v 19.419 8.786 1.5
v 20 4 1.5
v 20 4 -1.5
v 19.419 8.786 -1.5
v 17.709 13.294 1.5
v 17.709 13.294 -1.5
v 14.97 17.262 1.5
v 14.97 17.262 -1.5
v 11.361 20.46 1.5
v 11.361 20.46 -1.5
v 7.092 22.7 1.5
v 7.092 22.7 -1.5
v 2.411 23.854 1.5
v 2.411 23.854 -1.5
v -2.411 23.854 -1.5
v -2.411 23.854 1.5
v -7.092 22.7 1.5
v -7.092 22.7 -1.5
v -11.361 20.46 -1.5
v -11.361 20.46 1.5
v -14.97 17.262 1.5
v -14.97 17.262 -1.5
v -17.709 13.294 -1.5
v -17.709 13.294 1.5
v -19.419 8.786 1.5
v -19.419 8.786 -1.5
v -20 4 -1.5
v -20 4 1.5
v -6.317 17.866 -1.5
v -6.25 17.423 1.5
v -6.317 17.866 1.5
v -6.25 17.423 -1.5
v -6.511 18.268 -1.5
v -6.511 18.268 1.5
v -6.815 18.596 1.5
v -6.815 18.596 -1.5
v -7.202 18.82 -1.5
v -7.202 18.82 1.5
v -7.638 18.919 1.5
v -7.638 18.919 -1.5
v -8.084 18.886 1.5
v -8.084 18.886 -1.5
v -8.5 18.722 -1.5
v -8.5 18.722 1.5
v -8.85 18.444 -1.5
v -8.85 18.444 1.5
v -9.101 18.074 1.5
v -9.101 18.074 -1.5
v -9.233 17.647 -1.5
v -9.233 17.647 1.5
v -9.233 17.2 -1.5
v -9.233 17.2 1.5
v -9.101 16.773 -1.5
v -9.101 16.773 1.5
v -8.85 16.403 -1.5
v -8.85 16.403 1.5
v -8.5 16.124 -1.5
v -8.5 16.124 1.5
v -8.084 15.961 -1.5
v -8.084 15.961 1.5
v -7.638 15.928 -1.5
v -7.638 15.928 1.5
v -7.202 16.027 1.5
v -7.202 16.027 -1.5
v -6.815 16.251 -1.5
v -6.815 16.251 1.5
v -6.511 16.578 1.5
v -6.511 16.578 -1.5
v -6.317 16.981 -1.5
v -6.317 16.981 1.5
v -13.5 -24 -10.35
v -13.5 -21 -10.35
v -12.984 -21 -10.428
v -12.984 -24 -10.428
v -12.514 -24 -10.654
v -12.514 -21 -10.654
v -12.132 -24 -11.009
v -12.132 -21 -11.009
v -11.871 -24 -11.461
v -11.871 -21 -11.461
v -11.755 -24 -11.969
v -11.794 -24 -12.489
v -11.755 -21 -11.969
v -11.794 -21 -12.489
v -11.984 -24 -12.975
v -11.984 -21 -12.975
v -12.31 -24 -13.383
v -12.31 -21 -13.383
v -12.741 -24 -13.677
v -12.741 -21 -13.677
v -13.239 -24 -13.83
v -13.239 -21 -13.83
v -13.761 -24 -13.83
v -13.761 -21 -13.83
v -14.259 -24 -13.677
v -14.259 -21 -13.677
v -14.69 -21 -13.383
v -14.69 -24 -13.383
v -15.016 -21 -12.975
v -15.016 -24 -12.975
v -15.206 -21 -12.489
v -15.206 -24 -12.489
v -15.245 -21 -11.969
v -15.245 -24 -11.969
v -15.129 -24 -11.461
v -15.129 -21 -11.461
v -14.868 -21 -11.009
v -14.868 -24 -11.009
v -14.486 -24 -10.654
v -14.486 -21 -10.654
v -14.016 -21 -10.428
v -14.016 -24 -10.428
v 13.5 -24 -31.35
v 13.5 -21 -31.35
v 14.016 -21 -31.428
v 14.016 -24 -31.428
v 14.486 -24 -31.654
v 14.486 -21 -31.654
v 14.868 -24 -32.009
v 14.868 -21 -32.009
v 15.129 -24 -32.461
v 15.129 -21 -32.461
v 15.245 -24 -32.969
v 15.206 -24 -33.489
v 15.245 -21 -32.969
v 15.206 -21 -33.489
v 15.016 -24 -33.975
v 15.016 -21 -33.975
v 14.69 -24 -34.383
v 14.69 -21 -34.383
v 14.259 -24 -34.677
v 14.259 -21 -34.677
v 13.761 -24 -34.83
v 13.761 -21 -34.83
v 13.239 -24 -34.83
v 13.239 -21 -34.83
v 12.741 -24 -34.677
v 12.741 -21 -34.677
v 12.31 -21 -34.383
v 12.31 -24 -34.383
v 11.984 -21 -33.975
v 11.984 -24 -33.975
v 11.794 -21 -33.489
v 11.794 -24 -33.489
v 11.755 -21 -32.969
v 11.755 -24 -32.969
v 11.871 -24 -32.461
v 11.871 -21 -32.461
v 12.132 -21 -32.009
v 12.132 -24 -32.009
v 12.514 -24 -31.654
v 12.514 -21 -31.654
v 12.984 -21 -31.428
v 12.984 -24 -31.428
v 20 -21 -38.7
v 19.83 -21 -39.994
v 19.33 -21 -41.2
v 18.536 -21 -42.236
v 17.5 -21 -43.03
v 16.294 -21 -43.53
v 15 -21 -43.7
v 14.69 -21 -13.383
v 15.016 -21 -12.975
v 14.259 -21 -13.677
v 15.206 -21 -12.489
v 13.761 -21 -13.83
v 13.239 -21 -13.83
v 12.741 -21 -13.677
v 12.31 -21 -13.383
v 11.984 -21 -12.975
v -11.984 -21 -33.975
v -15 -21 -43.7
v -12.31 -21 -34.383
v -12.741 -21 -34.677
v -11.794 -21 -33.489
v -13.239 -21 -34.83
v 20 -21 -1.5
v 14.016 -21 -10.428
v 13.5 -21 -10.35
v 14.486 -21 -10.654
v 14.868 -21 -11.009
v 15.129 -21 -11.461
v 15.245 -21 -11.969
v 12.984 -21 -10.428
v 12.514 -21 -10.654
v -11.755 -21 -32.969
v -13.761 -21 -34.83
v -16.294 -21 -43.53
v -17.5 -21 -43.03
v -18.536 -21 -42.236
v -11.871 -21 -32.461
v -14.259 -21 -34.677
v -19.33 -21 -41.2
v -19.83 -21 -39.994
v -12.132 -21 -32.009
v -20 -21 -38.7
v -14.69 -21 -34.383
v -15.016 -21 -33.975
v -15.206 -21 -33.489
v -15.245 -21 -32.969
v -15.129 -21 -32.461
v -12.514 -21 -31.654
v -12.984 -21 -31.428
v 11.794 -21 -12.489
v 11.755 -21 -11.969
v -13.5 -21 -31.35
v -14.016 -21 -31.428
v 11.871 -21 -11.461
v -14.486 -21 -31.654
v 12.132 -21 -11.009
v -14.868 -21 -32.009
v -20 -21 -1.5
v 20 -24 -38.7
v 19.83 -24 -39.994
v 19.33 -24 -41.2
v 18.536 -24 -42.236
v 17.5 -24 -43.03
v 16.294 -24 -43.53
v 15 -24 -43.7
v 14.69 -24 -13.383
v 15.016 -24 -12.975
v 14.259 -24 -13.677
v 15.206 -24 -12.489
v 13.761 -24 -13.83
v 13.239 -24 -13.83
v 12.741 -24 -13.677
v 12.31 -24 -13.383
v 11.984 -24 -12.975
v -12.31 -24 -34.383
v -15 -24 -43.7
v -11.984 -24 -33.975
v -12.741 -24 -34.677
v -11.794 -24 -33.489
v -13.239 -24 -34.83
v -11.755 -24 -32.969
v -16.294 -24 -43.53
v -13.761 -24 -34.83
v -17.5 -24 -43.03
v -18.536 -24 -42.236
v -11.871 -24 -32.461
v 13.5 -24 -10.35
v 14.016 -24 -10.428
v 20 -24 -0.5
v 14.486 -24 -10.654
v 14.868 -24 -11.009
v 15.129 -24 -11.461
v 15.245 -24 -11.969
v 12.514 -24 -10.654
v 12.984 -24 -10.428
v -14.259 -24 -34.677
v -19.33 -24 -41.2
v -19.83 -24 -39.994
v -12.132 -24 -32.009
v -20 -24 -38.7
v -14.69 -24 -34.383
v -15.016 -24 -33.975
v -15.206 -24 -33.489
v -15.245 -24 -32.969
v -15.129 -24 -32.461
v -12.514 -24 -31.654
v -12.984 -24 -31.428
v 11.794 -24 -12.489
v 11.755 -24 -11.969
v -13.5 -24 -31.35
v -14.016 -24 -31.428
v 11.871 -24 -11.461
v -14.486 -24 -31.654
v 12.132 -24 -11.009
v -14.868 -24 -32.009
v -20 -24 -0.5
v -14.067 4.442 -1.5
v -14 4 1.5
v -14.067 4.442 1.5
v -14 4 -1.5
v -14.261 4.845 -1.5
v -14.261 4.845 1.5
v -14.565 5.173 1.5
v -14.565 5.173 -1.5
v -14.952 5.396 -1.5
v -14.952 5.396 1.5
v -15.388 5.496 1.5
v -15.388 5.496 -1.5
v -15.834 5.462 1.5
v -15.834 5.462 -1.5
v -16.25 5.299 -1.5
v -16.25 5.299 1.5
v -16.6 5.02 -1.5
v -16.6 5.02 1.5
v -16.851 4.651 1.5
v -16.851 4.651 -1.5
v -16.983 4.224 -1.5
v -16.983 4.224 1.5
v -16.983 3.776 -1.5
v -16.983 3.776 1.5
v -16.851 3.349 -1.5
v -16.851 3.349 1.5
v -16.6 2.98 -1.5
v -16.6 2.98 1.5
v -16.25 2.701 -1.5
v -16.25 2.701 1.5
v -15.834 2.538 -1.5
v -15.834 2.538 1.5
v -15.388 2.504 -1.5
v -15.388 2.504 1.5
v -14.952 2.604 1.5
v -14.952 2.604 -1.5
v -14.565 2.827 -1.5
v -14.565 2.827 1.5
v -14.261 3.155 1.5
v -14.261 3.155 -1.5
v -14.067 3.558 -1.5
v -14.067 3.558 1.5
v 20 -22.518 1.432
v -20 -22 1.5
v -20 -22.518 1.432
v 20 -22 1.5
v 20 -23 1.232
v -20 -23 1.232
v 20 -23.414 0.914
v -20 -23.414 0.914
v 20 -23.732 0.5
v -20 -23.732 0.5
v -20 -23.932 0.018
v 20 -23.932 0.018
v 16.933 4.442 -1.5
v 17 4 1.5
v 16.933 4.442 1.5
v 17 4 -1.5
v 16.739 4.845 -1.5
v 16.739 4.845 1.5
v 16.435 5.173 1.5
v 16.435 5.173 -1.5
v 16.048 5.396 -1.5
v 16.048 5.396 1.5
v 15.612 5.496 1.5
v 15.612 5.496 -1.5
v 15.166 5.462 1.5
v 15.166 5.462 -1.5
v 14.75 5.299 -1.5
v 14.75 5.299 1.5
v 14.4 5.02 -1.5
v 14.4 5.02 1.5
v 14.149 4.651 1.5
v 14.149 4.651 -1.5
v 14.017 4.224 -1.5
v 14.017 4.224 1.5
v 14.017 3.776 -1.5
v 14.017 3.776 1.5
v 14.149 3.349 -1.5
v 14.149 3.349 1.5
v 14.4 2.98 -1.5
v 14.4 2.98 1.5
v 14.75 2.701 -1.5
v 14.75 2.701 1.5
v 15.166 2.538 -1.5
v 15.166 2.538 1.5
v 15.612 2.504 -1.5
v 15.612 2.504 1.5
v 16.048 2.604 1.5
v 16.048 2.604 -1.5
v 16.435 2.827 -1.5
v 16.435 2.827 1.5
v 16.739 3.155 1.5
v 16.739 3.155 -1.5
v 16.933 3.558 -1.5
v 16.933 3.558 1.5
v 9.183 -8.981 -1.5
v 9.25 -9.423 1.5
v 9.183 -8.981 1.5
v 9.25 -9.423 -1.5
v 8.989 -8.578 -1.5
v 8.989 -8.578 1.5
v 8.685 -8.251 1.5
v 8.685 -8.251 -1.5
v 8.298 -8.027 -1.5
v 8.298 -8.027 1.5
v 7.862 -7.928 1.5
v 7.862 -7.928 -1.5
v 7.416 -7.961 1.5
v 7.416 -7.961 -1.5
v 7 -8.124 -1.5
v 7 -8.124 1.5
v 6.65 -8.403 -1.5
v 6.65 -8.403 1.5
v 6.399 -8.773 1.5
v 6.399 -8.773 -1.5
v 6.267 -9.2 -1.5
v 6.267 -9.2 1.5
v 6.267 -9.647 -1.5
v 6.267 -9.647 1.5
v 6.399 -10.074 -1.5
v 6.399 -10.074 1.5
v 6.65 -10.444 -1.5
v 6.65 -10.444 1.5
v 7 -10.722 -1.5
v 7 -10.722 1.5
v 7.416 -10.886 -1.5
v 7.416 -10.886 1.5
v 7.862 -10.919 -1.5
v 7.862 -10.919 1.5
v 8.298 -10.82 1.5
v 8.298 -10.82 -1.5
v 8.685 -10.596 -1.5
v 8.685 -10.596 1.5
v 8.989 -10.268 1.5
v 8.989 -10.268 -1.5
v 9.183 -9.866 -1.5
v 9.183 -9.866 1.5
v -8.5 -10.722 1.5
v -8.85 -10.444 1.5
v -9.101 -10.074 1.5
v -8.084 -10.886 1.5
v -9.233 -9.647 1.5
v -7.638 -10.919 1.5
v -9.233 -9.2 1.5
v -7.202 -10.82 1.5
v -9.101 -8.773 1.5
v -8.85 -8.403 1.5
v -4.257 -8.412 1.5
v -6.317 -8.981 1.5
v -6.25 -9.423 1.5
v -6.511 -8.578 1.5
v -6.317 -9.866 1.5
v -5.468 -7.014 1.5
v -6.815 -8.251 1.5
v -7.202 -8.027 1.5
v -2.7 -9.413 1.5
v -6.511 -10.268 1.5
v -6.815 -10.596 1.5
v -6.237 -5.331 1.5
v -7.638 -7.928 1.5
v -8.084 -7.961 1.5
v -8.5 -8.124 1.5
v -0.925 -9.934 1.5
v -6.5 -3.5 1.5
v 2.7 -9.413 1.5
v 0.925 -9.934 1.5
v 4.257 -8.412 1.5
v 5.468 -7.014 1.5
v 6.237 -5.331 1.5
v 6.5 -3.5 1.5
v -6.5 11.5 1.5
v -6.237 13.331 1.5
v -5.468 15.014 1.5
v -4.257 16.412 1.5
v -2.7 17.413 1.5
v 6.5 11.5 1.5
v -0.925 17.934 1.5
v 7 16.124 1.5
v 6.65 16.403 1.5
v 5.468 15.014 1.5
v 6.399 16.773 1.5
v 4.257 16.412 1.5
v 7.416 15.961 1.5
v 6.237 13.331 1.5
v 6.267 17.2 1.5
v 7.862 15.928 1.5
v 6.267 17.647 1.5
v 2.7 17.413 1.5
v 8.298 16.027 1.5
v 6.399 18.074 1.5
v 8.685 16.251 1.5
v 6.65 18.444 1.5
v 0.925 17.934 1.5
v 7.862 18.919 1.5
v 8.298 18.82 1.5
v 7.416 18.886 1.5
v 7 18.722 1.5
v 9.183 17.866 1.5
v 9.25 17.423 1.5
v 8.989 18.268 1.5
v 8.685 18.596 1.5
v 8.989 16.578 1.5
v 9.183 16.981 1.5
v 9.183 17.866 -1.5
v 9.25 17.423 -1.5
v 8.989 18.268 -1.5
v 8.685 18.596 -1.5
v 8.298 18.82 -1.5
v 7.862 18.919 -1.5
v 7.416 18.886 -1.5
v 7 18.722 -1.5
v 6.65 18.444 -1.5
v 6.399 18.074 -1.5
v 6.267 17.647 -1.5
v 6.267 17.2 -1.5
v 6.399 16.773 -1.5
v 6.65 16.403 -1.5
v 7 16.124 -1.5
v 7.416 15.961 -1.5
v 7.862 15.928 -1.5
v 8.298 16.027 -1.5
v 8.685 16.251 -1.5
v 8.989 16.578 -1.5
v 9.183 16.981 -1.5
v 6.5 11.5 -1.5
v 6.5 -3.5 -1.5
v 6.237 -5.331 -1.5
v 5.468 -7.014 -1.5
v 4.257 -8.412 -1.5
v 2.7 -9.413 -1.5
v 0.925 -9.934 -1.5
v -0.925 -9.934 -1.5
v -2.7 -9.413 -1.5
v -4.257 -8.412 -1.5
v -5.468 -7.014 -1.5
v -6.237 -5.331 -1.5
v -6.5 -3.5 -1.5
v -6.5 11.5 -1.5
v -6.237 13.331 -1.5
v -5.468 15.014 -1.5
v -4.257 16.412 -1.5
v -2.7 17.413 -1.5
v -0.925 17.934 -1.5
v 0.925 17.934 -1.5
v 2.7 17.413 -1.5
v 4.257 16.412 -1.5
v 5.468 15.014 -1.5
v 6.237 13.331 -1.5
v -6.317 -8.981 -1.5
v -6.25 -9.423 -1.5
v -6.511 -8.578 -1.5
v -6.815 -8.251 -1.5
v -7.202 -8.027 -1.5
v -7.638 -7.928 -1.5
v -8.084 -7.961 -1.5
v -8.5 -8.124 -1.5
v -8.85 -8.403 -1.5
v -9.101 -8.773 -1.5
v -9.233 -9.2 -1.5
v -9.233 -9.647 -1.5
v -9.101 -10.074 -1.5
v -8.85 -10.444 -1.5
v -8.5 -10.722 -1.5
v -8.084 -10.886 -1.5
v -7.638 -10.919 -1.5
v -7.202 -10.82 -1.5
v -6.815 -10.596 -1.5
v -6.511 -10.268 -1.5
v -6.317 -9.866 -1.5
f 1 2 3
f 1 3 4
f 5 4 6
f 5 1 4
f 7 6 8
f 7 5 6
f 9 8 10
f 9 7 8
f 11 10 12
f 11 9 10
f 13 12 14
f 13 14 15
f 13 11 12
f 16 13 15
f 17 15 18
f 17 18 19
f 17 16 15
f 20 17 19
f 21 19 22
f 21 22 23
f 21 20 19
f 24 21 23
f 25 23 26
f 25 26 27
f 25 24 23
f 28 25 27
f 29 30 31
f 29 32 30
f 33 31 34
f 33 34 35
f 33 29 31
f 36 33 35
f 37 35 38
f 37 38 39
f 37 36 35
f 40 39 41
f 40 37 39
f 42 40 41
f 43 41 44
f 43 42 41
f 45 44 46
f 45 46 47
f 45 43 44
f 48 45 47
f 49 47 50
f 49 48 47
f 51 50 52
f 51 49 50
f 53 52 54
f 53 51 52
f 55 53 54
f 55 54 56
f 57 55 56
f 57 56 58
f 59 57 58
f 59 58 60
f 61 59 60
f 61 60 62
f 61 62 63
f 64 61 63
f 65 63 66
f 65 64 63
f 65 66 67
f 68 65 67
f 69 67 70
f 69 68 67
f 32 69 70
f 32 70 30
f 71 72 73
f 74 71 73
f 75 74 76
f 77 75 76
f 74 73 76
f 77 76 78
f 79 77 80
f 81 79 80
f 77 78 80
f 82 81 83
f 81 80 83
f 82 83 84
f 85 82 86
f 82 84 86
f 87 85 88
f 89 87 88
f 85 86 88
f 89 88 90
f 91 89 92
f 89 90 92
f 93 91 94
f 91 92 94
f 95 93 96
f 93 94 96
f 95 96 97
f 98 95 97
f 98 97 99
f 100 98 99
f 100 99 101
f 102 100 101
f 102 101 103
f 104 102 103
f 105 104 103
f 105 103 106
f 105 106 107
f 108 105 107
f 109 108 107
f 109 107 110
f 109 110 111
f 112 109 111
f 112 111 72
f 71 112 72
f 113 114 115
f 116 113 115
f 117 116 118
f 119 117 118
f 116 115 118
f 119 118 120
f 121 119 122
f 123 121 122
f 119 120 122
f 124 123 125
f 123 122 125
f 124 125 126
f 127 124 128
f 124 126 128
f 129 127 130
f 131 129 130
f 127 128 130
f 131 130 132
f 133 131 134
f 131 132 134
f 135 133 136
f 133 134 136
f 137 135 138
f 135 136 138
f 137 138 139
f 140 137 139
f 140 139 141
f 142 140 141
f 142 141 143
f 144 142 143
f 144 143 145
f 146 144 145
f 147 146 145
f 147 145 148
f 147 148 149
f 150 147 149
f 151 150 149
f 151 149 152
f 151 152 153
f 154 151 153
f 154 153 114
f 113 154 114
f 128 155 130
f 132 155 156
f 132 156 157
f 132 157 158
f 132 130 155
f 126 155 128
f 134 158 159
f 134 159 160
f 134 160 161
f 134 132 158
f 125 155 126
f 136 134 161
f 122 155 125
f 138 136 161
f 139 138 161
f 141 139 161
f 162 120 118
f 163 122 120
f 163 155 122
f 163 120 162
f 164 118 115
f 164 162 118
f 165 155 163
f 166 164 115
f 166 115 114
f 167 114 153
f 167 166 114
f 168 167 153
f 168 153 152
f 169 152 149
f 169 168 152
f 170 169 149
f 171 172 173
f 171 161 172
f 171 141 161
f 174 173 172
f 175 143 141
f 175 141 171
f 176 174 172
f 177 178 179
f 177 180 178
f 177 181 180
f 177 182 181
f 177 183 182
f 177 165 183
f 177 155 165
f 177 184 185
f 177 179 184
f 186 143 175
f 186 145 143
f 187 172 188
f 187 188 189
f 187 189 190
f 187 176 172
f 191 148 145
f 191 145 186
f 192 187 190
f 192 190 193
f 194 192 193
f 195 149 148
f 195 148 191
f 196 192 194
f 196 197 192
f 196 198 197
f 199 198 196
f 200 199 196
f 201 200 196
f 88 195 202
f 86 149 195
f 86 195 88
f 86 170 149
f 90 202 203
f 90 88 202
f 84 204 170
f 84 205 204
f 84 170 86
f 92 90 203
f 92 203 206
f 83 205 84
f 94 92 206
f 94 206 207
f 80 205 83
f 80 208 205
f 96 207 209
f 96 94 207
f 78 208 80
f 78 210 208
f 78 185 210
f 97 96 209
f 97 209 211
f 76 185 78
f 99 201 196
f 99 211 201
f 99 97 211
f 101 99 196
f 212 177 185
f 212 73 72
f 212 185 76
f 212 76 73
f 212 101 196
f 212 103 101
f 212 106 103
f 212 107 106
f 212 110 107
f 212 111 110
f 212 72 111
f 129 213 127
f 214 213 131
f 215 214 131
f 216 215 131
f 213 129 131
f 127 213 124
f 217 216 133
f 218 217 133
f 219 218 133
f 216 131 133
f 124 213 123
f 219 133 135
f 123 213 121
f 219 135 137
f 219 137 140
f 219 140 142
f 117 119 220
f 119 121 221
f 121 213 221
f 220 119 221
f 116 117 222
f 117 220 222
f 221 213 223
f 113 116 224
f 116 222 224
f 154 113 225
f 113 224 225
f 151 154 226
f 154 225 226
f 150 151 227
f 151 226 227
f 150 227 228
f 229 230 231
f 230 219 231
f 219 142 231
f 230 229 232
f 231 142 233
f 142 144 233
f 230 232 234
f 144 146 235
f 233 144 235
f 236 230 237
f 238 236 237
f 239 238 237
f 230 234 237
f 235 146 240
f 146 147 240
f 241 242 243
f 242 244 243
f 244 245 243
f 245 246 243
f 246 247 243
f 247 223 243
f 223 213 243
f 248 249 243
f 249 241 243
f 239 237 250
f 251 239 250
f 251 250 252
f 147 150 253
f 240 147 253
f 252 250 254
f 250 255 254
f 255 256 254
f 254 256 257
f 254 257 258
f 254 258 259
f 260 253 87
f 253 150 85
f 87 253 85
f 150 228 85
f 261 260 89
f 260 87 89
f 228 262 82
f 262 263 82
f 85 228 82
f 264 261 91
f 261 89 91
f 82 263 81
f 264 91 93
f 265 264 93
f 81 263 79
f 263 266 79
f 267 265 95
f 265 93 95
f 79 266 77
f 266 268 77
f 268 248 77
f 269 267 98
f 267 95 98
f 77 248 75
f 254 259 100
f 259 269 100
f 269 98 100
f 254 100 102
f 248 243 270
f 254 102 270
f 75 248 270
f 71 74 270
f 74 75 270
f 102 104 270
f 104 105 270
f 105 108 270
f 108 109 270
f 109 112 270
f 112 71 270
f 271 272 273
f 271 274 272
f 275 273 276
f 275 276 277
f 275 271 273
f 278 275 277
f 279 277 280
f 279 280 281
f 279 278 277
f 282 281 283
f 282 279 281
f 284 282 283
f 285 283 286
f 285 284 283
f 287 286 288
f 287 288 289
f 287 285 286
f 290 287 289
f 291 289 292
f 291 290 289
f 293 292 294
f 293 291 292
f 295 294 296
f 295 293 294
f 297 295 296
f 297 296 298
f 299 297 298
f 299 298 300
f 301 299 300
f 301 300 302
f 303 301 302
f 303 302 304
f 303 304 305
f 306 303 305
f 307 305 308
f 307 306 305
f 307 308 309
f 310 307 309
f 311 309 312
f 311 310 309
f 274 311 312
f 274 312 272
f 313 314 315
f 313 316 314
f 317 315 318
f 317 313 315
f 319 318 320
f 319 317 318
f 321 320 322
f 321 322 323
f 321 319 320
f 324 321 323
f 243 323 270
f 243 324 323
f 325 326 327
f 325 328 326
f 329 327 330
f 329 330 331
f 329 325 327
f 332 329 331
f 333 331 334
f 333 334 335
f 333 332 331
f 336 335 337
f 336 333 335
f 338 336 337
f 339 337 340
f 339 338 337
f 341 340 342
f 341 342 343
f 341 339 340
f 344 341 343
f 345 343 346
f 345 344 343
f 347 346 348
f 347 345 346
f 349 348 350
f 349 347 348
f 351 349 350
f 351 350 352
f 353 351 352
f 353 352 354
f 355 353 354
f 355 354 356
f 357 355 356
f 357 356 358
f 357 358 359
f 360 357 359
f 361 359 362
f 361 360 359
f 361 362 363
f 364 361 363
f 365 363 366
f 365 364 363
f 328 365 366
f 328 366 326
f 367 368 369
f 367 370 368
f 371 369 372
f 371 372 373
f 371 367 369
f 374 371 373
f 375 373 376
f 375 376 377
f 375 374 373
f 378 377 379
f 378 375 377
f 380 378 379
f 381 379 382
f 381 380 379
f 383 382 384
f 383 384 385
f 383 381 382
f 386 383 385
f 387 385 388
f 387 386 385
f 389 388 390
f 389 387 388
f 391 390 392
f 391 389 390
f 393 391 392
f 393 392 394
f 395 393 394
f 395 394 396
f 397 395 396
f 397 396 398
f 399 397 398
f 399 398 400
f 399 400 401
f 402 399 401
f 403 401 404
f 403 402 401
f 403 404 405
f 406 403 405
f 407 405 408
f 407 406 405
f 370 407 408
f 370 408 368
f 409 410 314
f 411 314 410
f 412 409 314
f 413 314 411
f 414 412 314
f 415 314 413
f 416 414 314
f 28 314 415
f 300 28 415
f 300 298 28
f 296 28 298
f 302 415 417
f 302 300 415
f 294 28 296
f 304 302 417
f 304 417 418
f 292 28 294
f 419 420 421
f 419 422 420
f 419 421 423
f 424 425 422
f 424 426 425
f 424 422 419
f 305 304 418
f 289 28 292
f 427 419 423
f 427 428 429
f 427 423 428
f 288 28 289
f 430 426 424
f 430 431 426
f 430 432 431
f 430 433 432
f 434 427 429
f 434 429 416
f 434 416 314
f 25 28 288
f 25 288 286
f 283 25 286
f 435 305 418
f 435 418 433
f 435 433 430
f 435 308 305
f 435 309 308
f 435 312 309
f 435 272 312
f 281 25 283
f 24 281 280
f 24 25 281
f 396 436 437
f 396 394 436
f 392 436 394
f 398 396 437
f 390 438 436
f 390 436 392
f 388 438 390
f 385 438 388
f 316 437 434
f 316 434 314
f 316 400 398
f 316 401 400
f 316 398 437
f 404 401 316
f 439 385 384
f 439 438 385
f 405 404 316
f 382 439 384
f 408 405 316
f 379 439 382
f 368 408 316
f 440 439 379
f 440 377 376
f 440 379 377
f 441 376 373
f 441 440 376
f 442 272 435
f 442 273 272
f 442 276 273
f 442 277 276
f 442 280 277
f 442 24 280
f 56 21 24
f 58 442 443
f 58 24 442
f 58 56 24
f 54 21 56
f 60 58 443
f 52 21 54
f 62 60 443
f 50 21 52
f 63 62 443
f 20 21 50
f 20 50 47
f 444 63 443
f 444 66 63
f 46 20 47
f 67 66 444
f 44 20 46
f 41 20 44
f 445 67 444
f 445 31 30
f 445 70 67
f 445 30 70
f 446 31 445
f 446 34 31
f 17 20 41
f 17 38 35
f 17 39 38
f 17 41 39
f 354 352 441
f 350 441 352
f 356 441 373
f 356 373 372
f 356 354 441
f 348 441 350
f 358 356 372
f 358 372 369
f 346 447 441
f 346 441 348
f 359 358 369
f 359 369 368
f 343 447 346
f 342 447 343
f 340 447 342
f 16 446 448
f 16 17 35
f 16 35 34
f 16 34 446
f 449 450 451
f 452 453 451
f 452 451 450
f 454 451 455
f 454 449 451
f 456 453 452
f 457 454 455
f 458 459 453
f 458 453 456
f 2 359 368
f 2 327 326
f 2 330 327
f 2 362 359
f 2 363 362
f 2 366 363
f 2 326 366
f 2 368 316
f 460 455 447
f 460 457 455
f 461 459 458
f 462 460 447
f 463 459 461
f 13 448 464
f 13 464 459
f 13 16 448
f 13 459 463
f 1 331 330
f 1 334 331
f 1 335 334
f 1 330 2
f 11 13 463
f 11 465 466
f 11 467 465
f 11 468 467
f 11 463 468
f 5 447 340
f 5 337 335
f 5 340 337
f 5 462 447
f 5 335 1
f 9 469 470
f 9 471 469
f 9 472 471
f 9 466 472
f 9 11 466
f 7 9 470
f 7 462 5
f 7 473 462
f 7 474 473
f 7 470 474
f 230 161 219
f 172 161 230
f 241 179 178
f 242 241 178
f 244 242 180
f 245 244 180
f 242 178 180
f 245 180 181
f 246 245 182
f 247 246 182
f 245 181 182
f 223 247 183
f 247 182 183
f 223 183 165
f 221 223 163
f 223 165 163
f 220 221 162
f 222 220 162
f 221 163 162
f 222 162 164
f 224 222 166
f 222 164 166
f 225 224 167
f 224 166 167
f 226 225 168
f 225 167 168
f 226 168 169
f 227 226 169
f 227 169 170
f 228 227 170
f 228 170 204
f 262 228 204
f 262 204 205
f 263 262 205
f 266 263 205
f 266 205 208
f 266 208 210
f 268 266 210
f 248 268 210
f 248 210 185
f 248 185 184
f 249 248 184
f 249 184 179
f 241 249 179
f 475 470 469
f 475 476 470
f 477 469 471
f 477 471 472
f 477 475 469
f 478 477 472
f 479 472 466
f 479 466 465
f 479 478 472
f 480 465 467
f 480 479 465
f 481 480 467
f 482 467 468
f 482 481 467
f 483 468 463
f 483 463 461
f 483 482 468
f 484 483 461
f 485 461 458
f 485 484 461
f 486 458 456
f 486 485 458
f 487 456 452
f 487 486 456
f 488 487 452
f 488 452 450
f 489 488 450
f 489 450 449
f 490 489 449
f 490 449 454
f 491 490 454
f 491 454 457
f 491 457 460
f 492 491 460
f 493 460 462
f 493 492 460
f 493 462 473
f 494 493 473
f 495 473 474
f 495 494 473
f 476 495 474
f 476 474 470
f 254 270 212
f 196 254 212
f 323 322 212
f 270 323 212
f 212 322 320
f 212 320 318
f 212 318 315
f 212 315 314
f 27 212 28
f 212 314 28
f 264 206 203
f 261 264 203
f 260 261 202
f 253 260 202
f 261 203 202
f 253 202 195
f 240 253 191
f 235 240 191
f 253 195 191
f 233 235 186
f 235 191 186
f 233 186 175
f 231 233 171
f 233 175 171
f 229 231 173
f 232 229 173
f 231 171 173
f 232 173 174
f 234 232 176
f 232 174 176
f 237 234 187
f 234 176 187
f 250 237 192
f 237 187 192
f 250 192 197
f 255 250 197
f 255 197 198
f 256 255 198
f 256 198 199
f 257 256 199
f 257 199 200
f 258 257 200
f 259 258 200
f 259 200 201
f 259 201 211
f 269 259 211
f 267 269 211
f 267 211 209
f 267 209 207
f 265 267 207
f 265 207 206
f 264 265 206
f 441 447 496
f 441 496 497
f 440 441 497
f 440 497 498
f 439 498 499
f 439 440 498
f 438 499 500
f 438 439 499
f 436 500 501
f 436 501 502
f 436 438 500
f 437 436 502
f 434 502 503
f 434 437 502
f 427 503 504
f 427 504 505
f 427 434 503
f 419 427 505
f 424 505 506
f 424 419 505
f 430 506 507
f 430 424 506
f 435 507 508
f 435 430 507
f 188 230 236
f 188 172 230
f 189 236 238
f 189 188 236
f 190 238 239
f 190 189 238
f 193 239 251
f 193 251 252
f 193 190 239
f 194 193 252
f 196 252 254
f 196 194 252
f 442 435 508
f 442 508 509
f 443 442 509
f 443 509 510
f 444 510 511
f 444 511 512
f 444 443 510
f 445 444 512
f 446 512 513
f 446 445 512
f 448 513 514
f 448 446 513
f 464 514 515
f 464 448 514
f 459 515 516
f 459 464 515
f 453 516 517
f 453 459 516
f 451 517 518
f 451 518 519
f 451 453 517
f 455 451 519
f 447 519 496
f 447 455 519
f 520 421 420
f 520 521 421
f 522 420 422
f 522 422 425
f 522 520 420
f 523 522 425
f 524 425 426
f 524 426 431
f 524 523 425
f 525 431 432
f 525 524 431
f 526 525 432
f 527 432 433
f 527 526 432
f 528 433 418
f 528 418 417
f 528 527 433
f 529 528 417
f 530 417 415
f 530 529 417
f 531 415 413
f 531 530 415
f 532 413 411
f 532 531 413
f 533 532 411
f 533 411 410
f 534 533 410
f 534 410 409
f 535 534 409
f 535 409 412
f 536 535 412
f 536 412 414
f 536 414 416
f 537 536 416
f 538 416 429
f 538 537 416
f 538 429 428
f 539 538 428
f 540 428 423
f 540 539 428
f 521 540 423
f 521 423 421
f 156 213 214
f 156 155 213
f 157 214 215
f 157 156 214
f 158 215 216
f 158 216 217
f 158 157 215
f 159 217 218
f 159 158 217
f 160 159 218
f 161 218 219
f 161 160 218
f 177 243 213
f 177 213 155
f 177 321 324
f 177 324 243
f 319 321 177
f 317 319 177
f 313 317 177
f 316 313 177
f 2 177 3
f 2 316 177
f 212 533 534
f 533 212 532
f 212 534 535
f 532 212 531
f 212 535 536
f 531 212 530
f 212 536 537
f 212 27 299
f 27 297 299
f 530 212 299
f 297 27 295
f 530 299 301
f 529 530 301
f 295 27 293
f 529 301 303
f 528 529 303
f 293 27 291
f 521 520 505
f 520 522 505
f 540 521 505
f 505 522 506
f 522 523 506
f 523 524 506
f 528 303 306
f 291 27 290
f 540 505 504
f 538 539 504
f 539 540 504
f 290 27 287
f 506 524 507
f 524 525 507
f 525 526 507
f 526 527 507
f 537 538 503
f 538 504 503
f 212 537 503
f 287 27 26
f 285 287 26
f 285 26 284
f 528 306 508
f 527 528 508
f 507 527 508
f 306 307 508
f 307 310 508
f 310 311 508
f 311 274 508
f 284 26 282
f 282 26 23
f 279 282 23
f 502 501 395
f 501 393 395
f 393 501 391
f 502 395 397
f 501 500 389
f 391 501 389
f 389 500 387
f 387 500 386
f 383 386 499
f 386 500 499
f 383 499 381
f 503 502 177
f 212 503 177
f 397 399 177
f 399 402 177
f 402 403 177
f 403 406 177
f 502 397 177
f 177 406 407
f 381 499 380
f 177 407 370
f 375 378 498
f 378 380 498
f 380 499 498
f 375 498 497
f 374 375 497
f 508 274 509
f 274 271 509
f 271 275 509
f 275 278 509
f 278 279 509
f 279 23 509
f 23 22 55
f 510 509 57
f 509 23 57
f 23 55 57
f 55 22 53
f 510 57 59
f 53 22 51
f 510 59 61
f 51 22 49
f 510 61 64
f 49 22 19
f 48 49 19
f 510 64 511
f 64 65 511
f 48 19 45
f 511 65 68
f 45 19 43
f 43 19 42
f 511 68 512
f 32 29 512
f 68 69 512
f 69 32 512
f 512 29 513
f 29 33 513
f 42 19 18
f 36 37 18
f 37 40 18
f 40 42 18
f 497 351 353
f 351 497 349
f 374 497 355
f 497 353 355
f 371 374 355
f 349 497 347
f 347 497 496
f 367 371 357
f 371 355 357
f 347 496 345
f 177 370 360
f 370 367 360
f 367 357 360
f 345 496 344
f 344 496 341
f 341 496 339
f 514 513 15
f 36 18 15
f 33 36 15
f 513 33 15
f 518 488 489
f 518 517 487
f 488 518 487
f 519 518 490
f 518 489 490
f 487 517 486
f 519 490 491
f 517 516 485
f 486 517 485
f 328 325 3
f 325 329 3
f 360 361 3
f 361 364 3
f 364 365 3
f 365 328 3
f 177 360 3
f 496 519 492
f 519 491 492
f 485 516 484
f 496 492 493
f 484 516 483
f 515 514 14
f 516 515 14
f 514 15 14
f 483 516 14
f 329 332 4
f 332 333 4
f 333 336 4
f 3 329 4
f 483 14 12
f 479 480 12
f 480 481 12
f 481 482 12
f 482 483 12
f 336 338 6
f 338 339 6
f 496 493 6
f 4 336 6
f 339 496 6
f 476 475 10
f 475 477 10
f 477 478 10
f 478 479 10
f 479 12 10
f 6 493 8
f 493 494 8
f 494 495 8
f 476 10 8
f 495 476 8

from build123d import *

# Parameters (mm, degrees)
CROQUIS1_R              = 1.5
SALIENTE_EXTRUIR1_DEPTH = 1.5
CORTAR_EXTRUIR3_DEPTH   = 3
CROQUIS3_W              = 40
CROQUIS3_H              = 3
SALIENTE_EXTRUIR2_DEPTH = 42.2
CROQUIS4_R              = 1.75
CORTAR_EXTRUIR5_DEPTH   = 42.2
REDONDEO1_R             = 2
REDONDEO2_R             = 5


with BuildPart() as part:
    # Croquis1 → Saliente-Extruir1 (new, symmetric)
    with BuildSketch(Plane.XY):
        with BuildLine():
            Line((-20, -24), (20, -24))
            Line((20, -24), (20, 4))
            ThreePointArc((20, 4), (0, 24), (-20, 4))
            Line((-20, 4), (-20, -24))
        make_face()
        with Locations((-15.5, 4)):
            Circle(CROQUIS1_R, mode=Mode.SUBTRACT)
        with Locations((-7.75, 17.423393759)):
            Circle(CROQUIS1_R, mode=Mode.SUBTRACT)
        with Locations((7.75, 17.423393759)):
            Circle(CROQUIS1_R, mode=Mode.SUBTRACT)
        with Locations((15.5, 4)):
            Circle(CROQUIS1_R, mode=Mode.SUBTRACT)
        with Locations((7.75, -9.423393759)):
            Circle(CROQUIS1_R, mode=Mode.SUBTRACT)
        with Locations((-7.75, -9.423393759)):
            Circle(CROQUIS1_R, mode=Mode.SUBTRACT)
    extrude(amount=SALIENTE_EXTRUIR1_DEPTH, both=True)

    # Croquis2 → Cortar-Extruir3 (cut)
    with BuildSketch(Plane.XY.offset(1.5)):
        with BuildLine():
            Line((6.5, 11.5), (6.5, -3.5))
            ThreePointArc((6.5, -3.5), (0, -10), (-6.5, -3.5))
            Line((-6.5, -3.5), (-6.5, 11.5))
            ThreePointArc((-6.5, 11.5), (0, 18), (6.5, 11.5))
        make_face()
    extrude(amount=-CORTAR_EXTRUIR3_DEPTH, mode=Mode.SUBTRACT)

    # Croquis3 → Saliente-Extruir2 (add)
    with BuildSketch(Plane(origin=(0, 0, -1.5), x_dir=(-1, 0, 0), z_dir=(0, 0, -1))):
        with Locations((0, -22.5)):
            Rectangle(CROQUIS3_W, CROQUIS3_H)
    extrude(amount=SALIENTE_EXTRUIR2_DEPTH)

    # Croquis4 → Cortar-Extruir5 (cut)
    with BuildSketch(Plane(origin=(0, -21, 0), x_dir=(1, 0, 0), z_dir=(0, 1, 0))):
        with Locations(Location((-13.5, 33.1, 0), (0, 0, 270))):
            Circle(CROQUIS4_R)
        with Locations(Location((13.5, 33.1, 0), (0, 0, 270))):
            Circle(CROQUIS4_R)
        with Locations(Location((13.5, 12.1, 0), (0, 0, 270))):
            Circle(CROQUIS4_R)
        with Locations(Location((-13.5, 12.1, 0), (0, 0, 270))):
            Circle(CROQUIS4_R)
    extrude(amount=-CORTAR_EXTRUIR5_DEPTH, mode=Mode.SUBTRACT)

    # Redondeo1
    redondeo1_edges = [part.edges().sort_by_distance(p)[0] for p in [
        (0, -24, 1.5),
    ]]
    fillet(redondeo1_edges, radius=REDONDEO1_R)

    # Redondeo2
    redondeo2_edges = [part.edges().sort_by_distance(p)[0] for p in [
        (20, -22.5, -43.7),
        (-20, -22.5, -43.7),
    ]]
    fillet(redondeo2_edges, radius=REDONDEO2_R)


solid = part.part
